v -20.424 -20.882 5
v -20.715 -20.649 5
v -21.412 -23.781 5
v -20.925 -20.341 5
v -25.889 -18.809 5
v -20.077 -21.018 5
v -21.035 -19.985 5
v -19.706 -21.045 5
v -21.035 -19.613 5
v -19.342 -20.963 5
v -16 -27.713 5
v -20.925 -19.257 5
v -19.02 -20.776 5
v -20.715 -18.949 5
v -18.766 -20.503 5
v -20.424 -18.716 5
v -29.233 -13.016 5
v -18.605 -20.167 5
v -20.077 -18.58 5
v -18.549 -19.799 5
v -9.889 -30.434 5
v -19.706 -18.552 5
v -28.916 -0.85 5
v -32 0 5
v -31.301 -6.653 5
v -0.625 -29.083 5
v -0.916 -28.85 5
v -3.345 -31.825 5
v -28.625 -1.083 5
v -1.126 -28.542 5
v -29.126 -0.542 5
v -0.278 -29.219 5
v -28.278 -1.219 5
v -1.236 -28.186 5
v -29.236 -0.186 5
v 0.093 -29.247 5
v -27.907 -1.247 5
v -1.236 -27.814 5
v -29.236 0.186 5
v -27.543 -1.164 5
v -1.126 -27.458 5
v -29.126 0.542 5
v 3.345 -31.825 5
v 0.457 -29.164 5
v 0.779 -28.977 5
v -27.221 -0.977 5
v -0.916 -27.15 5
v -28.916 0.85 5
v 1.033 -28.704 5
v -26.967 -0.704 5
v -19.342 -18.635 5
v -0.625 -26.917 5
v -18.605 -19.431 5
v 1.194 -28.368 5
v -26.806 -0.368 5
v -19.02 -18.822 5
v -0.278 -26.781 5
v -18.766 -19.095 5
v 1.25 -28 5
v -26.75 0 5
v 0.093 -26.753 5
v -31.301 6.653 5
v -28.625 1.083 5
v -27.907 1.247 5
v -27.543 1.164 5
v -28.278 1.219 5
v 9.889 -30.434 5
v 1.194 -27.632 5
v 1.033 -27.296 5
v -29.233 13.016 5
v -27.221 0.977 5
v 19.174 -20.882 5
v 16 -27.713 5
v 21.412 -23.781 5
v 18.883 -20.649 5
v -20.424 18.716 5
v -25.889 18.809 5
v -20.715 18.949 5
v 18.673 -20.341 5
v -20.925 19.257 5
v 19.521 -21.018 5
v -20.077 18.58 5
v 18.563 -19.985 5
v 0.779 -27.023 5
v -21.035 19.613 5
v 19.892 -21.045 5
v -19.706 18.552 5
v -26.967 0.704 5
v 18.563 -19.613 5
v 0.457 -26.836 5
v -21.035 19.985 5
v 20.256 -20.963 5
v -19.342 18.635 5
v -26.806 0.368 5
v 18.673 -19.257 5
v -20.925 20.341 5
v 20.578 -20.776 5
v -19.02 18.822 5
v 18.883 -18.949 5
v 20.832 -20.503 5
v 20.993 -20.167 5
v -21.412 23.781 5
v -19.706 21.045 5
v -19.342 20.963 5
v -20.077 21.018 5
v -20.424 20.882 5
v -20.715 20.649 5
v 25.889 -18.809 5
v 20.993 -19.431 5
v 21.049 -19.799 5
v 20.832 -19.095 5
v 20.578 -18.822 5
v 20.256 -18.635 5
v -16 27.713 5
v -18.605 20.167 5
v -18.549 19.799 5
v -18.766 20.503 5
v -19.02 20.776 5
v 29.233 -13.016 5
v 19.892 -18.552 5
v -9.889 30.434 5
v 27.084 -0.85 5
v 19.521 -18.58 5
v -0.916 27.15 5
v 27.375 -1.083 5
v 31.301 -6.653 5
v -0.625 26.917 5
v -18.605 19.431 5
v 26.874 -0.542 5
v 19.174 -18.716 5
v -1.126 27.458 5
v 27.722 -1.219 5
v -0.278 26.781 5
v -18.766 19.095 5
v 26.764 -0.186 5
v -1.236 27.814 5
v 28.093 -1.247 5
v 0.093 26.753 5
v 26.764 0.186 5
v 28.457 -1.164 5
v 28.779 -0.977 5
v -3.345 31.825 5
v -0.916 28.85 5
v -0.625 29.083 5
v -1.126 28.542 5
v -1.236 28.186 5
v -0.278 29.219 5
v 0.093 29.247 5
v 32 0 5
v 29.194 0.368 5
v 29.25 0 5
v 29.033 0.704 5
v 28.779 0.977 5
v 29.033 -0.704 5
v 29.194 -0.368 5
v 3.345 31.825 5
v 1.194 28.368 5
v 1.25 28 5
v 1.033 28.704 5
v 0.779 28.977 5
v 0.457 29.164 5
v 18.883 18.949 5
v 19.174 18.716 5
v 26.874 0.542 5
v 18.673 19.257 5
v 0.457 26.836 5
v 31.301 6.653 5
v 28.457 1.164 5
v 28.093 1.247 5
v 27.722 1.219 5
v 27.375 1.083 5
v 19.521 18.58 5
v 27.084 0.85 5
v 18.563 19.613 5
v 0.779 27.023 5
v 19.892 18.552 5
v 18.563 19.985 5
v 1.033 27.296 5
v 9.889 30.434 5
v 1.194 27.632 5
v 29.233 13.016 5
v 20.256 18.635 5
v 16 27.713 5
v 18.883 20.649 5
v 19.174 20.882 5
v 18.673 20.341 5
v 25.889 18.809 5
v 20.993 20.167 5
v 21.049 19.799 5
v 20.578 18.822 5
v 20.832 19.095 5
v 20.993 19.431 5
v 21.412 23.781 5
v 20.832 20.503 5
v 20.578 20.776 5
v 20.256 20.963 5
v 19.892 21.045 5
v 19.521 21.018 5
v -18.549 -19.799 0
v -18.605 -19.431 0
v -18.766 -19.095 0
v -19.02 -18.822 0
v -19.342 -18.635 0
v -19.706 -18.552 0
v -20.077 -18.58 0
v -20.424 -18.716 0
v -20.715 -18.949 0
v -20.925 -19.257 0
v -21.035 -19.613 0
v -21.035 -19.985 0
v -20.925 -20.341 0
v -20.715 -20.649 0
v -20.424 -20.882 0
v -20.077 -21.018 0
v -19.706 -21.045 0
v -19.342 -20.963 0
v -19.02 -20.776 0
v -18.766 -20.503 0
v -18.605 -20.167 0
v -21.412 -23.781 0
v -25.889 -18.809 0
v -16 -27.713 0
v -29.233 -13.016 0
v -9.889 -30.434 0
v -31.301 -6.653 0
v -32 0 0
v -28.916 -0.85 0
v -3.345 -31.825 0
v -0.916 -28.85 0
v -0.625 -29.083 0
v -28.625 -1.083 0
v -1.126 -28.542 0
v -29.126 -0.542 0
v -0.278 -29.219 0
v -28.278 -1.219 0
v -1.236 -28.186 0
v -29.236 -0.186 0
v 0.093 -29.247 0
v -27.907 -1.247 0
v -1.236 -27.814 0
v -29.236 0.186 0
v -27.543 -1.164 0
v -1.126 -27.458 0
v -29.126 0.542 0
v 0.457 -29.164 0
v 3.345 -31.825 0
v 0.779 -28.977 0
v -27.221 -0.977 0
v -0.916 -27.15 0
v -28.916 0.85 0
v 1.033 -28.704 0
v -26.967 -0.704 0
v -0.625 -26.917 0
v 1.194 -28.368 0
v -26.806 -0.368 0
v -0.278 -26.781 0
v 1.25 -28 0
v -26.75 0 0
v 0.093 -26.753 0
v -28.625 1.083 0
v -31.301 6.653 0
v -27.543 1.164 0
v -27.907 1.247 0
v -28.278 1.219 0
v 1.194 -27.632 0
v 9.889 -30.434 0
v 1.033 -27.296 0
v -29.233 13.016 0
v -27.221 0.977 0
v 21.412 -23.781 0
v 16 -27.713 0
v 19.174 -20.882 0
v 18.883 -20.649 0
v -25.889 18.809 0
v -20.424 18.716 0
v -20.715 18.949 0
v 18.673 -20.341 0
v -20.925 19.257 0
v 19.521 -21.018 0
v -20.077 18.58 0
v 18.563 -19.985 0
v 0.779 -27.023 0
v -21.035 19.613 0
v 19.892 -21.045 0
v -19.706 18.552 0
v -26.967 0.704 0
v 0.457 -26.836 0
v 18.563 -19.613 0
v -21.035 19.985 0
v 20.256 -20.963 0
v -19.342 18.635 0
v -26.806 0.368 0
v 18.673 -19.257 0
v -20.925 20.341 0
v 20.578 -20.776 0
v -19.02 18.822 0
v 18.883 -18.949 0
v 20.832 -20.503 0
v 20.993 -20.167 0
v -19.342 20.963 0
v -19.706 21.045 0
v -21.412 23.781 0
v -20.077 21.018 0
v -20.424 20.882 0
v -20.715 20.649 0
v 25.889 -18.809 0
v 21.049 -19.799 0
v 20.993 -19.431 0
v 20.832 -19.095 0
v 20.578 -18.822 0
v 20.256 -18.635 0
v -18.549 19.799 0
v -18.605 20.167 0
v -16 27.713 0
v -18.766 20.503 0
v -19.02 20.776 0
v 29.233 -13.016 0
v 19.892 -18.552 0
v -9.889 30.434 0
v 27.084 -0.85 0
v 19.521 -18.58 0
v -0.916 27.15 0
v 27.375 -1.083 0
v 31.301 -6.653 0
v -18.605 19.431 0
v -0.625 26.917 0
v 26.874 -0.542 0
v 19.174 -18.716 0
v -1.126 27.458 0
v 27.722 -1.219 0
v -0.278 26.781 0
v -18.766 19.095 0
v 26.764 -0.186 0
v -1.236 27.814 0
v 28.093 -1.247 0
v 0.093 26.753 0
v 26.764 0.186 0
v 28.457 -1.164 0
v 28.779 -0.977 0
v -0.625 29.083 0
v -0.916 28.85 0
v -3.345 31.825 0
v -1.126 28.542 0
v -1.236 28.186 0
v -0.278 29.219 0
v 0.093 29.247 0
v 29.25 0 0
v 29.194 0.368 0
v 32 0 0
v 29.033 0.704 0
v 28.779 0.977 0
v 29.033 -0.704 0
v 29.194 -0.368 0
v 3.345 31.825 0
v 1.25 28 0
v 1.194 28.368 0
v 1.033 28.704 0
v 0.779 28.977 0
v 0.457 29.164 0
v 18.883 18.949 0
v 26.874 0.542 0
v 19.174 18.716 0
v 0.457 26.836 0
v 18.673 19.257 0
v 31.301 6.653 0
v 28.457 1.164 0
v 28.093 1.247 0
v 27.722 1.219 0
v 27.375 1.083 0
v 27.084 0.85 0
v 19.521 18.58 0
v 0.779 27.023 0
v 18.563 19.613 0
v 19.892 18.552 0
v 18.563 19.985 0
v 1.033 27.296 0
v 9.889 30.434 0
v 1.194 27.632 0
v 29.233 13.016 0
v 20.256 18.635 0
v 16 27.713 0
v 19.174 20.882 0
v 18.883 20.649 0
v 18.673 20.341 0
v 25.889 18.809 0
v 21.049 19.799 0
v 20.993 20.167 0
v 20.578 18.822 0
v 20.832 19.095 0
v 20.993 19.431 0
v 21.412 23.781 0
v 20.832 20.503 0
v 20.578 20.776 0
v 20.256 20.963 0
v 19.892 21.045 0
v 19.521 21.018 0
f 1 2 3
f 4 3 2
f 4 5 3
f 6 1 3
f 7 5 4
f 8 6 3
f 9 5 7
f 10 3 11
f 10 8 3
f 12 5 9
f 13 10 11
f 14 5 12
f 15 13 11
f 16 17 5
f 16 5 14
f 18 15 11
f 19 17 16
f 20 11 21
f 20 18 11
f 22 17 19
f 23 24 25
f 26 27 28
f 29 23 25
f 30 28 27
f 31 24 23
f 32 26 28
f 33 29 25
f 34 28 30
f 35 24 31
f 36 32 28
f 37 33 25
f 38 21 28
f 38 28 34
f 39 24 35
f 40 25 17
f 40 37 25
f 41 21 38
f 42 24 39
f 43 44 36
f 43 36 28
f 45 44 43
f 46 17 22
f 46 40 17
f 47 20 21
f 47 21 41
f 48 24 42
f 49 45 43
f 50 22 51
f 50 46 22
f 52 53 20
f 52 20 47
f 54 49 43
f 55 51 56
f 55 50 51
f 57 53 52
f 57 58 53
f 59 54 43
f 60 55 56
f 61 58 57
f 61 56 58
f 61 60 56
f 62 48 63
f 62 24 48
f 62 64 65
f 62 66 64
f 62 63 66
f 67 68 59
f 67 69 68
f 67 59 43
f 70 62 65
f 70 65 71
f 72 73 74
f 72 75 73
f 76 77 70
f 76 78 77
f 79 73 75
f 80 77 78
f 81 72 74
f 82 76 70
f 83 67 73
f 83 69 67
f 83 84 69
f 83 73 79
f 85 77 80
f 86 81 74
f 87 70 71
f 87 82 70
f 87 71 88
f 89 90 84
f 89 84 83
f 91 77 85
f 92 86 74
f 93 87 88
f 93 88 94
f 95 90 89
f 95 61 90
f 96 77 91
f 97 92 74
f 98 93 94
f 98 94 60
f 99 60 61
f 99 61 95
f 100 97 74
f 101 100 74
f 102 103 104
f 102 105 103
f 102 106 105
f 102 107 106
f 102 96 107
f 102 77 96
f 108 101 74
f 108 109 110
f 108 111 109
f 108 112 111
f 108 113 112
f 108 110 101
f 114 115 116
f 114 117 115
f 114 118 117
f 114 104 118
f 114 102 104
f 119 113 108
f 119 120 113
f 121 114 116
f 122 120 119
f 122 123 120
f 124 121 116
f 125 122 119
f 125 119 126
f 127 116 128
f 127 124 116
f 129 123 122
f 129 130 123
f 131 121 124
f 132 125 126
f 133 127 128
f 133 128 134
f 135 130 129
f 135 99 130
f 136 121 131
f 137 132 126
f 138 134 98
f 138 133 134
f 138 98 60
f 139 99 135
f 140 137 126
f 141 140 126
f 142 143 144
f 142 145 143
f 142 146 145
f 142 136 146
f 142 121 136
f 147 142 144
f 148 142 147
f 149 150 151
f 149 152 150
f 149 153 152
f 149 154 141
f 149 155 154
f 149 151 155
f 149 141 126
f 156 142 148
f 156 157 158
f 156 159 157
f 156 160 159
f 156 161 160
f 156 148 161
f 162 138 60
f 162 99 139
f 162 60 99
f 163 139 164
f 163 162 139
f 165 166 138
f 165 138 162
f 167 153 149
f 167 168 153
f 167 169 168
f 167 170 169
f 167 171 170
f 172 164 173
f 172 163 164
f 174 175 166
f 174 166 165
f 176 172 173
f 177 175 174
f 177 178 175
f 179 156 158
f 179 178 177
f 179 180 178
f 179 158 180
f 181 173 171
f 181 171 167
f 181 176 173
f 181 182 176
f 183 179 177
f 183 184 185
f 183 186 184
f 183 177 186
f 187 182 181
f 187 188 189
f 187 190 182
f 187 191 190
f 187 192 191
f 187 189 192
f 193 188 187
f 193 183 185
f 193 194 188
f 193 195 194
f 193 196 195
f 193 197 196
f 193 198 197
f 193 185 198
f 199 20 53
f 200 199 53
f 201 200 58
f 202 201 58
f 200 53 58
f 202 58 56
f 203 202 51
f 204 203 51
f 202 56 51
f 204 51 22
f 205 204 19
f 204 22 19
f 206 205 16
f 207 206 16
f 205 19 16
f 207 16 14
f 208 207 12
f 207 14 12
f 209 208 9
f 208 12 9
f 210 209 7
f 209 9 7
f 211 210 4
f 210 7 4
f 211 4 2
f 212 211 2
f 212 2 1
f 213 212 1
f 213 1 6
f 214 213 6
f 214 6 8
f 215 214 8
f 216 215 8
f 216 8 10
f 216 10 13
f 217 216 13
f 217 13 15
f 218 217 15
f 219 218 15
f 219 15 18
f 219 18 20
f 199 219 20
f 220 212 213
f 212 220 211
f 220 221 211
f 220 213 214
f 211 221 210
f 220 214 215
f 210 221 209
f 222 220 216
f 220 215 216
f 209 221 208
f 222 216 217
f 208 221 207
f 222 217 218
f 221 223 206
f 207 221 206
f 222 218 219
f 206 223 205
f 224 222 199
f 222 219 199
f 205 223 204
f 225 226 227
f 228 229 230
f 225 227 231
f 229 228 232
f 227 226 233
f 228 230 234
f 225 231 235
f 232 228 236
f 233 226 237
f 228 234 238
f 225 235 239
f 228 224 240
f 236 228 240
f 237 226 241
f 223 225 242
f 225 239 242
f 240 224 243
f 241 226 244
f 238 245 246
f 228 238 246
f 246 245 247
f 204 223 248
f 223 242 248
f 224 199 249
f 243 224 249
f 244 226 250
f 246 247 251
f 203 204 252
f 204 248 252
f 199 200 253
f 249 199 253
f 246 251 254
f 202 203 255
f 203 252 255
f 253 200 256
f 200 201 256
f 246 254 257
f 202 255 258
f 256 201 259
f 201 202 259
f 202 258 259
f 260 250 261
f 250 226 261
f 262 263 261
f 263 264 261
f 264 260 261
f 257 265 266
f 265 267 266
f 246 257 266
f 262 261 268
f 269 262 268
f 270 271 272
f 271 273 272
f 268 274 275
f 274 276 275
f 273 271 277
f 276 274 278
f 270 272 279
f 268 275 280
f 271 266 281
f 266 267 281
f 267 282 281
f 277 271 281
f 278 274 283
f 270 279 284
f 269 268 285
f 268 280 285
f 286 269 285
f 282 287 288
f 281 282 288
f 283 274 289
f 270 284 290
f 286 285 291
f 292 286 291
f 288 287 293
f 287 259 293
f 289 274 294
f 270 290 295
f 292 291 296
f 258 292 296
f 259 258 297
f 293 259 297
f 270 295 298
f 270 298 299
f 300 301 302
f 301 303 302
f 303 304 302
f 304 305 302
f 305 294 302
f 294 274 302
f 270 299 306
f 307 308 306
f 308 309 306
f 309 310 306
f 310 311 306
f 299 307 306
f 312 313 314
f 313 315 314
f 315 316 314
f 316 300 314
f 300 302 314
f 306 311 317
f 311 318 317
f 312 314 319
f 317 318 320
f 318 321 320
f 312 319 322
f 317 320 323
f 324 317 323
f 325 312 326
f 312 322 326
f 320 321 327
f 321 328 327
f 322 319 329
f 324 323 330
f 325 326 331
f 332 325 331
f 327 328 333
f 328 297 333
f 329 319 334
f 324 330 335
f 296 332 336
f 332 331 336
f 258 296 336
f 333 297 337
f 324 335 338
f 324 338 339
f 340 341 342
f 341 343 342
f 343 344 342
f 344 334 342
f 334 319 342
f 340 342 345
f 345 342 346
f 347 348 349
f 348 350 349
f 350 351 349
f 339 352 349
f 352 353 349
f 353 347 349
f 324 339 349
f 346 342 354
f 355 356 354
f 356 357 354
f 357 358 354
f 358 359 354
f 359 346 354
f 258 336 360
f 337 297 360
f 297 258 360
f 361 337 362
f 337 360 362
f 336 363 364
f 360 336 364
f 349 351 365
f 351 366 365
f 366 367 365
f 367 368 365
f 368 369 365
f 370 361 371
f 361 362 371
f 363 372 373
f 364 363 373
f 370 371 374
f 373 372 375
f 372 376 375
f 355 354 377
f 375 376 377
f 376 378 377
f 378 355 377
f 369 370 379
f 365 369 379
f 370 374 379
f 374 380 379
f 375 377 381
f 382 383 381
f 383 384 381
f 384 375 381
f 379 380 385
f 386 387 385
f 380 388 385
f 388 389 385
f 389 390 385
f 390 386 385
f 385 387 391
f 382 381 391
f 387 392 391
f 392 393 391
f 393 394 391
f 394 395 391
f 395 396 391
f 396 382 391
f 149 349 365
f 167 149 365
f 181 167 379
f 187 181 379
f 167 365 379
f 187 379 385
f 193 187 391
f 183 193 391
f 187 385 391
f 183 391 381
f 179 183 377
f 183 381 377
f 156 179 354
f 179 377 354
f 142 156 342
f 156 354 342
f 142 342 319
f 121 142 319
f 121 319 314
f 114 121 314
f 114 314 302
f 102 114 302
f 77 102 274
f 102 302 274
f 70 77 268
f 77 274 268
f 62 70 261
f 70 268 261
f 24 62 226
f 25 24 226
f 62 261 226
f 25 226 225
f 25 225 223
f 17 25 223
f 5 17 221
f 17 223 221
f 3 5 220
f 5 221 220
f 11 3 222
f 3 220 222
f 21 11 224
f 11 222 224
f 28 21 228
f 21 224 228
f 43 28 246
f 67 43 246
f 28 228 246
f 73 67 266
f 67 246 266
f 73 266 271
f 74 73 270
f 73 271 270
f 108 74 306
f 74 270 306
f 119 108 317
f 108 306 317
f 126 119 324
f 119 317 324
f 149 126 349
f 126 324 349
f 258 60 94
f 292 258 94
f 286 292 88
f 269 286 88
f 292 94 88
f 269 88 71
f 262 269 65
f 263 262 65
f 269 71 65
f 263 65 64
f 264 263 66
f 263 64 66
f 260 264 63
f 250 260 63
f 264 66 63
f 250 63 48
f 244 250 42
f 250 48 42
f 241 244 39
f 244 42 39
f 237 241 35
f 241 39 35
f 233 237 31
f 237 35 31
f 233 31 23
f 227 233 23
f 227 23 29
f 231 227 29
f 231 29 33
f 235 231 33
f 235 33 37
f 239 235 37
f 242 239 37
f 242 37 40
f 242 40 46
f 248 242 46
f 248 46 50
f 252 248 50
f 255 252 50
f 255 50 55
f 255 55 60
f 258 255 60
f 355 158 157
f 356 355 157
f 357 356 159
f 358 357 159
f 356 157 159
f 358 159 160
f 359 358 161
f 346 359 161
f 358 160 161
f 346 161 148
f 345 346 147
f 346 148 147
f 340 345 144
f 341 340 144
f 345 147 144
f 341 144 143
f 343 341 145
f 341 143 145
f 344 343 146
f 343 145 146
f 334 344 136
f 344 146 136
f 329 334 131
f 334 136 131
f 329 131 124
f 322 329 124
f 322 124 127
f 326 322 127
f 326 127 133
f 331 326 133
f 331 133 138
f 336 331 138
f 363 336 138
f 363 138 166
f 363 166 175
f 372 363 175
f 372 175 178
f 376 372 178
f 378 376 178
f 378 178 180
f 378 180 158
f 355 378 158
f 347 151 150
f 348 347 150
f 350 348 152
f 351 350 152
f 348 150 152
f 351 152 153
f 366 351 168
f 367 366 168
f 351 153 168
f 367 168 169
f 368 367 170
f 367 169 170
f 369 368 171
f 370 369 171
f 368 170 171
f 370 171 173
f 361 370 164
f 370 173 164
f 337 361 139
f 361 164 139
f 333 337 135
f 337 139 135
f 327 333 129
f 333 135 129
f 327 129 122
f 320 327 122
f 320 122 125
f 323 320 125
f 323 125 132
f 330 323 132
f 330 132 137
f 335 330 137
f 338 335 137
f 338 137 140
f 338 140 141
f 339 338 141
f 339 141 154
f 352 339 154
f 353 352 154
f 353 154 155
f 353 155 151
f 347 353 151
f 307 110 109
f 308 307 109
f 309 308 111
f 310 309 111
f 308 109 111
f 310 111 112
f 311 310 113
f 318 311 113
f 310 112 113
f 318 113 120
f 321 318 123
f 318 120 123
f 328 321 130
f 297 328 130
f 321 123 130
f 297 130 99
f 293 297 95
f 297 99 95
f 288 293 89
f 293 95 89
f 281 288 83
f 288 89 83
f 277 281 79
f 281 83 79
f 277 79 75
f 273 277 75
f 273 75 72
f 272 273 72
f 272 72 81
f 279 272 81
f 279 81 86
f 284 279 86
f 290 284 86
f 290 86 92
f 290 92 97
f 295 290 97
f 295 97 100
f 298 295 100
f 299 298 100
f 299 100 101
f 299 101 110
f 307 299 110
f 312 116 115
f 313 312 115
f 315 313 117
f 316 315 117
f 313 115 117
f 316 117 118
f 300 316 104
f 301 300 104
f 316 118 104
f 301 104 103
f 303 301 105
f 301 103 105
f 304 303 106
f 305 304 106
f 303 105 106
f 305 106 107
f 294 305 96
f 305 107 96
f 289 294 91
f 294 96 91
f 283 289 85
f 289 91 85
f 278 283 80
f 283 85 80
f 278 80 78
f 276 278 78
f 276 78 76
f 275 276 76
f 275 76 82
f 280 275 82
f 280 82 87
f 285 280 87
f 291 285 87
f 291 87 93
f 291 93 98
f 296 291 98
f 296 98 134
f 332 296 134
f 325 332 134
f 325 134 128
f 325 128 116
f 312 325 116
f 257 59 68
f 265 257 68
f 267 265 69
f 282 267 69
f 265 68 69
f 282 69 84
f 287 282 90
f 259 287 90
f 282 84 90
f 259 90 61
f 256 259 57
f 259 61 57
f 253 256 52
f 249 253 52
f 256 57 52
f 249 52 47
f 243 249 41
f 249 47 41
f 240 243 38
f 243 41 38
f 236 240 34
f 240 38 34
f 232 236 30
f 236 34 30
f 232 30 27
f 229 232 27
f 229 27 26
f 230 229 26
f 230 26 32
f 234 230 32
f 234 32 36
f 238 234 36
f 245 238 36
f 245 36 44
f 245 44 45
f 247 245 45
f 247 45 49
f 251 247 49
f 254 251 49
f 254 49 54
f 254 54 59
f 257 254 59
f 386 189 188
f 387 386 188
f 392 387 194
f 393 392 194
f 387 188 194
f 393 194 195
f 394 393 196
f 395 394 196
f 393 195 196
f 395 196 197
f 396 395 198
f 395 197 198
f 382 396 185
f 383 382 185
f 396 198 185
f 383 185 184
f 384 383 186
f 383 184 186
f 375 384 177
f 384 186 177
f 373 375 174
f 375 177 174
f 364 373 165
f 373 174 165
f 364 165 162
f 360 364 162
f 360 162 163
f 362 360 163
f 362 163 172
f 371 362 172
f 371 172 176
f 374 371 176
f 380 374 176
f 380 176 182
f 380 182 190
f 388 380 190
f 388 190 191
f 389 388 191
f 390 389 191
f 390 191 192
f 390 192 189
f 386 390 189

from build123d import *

# Parameters (mm, degrees)
CROQUIS1_R              = 32
SALIENTE_EXTRUIR1_DEPTH = 5
CROQUIS2_R              = 1.25
CORTAR_EXTRUIR1_DEPTH   = 46.530209751


with BuildPart() as part:
    # Croquis1 → Saliente-Extruir1 (new body)
    with BuildSketch(Plane.XY):
        Circle(CROQUIS1_R)
    extrude(amount=SALIENTE_EXTRUIR1_DEPTH)

    # Croquis2 → Cortar-Extruir1 (cut, through all)
    with BuildSketch(Plane.XY.offset(5)):
        with Locations((0, 28)):
            Circle(CROQUIS2_R)
        with Locations((19.798989873, 19.798989873)):
            Circle(CROQUIS2_R)
        with Locations((28, 0)):
            Circle(CROQUIS2_R)
        with Locations((19.798989873, -19.798989873)):
            Circle(CROQUIS2_R)
        with Locations((0, -28)):
            Circle(CROQUIS2_R)
        with Locations((-19.798989873, -19.798989873)):
            Circle(CROQUIS2_R)
        with Locations((-28, 0)):
            Circle(CROQUIS2_R)
        with Locations((-19.798989873, 19.798989873)):
            Circle(CROQUIS2_R)
    extrude(amount=-CORTAR_EXTRUIR1_DEPTH, mode=Mode.SUBTRACT)


solid = part.part
